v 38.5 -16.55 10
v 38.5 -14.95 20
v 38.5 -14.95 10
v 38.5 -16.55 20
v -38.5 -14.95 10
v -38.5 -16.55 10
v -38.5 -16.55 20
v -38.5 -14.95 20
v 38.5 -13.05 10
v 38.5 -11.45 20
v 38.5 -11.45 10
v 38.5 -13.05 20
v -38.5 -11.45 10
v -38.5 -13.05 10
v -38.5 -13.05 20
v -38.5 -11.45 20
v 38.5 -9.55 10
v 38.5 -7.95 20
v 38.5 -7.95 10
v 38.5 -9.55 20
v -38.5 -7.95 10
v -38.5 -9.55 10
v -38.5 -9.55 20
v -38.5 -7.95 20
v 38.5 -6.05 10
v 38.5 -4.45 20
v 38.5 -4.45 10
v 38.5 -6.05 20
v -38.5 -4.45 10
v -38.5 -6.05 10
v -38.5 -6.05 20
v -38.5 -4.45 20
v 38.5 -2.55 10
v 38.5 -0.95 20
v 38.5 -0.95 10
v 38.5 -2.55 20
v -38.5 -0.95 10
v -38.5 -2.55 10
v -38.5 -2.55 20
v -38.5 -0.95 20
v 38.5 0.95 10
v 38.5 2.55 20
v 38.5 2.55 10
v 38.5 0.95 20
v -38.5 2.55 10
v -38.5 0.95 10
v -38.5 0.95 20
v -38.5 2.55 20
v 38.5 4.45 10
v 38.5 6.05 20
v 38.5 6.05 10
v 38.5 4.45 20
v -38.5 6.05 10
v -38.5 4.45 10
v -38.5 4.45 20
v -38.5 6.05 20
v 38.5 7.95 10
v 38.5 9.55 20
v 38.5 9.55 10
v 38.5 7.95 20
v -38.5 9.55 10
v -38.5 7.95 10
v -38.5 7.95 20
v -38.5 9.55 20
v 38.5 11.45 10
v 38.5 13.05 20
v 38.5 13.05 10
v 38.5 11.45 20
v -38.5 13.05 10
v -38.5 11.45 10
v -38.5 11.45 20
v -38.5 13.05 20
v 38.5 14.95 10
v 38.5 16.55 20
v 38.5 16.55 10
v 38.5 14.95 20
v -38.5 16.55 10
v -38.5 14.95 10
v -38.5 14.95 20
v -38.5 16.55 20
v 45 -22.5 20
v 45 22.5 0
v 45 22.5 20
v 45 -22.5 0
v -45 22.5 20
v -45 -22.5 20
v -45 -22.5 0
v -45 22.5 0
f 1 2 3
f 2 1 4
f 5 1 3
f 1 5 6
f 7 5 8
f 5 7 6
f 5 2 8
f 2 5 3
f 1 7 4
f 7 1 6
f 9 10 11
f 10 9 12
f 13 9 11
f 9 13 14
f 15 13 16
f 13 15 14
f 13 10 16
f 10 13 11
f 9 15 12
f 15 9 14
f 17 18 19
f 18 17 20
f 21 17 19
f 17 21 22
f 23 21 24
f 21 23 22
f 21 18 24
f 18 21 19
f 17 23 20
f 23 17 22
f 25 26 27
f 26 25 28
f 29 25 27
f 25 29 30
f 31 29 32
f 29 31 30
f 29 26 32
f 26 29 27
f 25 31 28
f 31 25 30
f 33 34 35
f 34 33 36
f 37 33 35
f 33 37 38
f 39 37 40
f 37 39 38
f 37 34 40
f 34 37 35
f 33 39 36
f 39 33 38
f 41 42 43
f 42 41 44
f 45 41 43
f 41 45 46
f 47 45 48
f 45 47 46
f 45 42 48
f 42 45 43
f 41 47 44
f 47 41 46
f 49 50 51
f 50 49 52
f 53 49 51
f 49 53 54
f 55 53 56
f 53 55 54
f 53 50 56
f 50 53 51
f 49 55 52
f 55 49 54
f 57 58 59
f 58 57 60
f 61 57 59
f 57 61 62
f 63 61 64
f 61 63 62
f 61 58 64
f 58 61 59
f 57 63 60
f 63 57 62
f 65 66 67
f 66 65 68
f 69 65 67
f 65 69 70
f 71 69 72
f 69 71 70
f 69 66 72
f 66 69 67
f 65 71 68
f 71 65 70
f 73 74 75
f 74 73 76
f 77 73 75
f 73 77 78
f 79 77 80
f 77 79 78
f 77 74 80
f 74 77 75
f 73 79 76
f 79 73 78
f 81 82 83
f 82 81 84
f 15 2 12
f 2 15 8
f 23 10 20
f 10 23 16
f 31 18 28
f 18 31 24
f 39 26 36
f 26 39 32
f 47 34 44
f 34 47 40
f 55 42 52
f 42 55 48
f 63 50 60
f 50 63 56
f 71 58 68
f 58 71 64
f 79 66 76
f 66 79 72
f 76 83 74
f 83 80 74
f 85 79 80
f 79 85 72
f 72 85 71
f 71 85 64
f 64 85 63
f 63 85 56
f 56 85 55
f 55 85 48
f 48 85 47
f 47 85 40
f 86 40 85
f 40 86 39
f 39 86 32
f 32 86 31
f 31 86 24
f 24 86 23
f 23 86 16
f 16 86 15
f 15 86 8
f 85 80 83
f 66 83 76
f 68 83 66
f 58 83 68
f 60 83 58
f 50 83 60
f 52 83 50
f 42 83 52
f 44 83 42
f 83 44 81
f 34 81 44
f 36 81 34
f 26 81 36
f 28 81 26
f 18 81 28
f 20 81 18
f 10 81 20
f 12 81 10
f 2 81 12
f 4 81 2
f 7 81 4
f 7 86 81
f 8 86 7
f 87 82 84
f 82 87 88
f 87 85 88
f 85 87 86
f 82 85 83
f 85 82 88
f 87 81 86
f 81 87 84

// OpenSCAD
// Slide drying rack - holds 10 microscope slides upright on their long edge
// Print orientation: base block on the XY plane, slots open upward (+Z)

// ---------------- Parameters ----------------
block_len    = 90;    // base block length along X (mm)
block_wid    = 45;    // base block width along Y (mm)
block_ht     = 20;    // base block height along Z (mm)

slot_len     = 77;    // slot length along X (mm)
slot_w       = 1.6;   // slot width along Y (mm)
slot_depth   = 10;    // slot depth from top face (mm)
slot_pitch   = 3.5;   // centre-to-centre slot spacing along Y (mm)
slot_count   = 10;    // number of slots

eps          = 0.5;   // overshoot so cutters pass cleanly through the top face

$fn = 64;

// ---------------- Model ----------------
difference() {
    // Solid base block, centred in X and Y, resting on z = 0
    translate([-block_len/2, -block_wid/2, 0])
        cube([block_len, block_wid, block_ht]);

    // Row of parallel slots, centred on the block in X and Y
    for (i = [0 : slot_count - 1]) {
        y_c = (i - (slot_count - 1)/2) * slot_pitch;
        translate([-slot_len/2, y_c - slot_w/2, block_ht - slot_depth])
            cube([slot_len, slot_w, slot_depth + eps]);
    }
}
